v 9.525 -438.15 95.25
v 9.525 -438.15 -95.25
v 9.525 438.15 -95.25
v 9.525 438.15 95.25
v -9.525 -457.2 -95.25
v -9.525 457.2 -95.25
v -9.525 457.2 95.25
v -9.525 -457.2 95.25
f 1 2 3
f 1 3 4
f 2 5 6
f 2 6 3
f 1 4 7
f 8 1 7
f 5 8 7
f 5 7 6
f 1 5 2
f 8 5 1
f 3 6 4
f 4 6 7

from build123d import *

# Parameters (mm, degrees)
F0_W     = 9.525
F0_H     = 95.25
F1_DEPTH = 457.2
F2_SIZE  = 19.04999


# Not quite as in the source:
# - a fillet or chamfer is up to 0.001 mm smaller than in the source, because OpenCascade refuses the exact size


with BuildPart() as f1:
    # F0 (on Front) → F1 (new body, symmetric)
    with BuildSketch(Plane.XZ):
        Polygon((9.525, 95.25), (-9.525, 95.25), (-9.525, 0), (0, 0), (9.525, 0), align=None)
        with Locations((-4.7625, -47.625)):
            Rectangle(F0_W, F0_H)
        with Locations((4.7625, -47.625)):
            Rectangle(F0_W, F0_H)
    extrude(amount=F1_DEPTH, both=True)

    # F2 (size 19.05 in the source; OpenCascade refuses exactly that, so slightly less here)
    f2_edges = [f1.edges().sort_by_distance(p)[0] for p in [
        (9.525, -457.2, 0),
        (9.525, 457.2, 0),
    ]]
    chamfer(f2_edges, length=F2_SIZE)


solid = f1.part
